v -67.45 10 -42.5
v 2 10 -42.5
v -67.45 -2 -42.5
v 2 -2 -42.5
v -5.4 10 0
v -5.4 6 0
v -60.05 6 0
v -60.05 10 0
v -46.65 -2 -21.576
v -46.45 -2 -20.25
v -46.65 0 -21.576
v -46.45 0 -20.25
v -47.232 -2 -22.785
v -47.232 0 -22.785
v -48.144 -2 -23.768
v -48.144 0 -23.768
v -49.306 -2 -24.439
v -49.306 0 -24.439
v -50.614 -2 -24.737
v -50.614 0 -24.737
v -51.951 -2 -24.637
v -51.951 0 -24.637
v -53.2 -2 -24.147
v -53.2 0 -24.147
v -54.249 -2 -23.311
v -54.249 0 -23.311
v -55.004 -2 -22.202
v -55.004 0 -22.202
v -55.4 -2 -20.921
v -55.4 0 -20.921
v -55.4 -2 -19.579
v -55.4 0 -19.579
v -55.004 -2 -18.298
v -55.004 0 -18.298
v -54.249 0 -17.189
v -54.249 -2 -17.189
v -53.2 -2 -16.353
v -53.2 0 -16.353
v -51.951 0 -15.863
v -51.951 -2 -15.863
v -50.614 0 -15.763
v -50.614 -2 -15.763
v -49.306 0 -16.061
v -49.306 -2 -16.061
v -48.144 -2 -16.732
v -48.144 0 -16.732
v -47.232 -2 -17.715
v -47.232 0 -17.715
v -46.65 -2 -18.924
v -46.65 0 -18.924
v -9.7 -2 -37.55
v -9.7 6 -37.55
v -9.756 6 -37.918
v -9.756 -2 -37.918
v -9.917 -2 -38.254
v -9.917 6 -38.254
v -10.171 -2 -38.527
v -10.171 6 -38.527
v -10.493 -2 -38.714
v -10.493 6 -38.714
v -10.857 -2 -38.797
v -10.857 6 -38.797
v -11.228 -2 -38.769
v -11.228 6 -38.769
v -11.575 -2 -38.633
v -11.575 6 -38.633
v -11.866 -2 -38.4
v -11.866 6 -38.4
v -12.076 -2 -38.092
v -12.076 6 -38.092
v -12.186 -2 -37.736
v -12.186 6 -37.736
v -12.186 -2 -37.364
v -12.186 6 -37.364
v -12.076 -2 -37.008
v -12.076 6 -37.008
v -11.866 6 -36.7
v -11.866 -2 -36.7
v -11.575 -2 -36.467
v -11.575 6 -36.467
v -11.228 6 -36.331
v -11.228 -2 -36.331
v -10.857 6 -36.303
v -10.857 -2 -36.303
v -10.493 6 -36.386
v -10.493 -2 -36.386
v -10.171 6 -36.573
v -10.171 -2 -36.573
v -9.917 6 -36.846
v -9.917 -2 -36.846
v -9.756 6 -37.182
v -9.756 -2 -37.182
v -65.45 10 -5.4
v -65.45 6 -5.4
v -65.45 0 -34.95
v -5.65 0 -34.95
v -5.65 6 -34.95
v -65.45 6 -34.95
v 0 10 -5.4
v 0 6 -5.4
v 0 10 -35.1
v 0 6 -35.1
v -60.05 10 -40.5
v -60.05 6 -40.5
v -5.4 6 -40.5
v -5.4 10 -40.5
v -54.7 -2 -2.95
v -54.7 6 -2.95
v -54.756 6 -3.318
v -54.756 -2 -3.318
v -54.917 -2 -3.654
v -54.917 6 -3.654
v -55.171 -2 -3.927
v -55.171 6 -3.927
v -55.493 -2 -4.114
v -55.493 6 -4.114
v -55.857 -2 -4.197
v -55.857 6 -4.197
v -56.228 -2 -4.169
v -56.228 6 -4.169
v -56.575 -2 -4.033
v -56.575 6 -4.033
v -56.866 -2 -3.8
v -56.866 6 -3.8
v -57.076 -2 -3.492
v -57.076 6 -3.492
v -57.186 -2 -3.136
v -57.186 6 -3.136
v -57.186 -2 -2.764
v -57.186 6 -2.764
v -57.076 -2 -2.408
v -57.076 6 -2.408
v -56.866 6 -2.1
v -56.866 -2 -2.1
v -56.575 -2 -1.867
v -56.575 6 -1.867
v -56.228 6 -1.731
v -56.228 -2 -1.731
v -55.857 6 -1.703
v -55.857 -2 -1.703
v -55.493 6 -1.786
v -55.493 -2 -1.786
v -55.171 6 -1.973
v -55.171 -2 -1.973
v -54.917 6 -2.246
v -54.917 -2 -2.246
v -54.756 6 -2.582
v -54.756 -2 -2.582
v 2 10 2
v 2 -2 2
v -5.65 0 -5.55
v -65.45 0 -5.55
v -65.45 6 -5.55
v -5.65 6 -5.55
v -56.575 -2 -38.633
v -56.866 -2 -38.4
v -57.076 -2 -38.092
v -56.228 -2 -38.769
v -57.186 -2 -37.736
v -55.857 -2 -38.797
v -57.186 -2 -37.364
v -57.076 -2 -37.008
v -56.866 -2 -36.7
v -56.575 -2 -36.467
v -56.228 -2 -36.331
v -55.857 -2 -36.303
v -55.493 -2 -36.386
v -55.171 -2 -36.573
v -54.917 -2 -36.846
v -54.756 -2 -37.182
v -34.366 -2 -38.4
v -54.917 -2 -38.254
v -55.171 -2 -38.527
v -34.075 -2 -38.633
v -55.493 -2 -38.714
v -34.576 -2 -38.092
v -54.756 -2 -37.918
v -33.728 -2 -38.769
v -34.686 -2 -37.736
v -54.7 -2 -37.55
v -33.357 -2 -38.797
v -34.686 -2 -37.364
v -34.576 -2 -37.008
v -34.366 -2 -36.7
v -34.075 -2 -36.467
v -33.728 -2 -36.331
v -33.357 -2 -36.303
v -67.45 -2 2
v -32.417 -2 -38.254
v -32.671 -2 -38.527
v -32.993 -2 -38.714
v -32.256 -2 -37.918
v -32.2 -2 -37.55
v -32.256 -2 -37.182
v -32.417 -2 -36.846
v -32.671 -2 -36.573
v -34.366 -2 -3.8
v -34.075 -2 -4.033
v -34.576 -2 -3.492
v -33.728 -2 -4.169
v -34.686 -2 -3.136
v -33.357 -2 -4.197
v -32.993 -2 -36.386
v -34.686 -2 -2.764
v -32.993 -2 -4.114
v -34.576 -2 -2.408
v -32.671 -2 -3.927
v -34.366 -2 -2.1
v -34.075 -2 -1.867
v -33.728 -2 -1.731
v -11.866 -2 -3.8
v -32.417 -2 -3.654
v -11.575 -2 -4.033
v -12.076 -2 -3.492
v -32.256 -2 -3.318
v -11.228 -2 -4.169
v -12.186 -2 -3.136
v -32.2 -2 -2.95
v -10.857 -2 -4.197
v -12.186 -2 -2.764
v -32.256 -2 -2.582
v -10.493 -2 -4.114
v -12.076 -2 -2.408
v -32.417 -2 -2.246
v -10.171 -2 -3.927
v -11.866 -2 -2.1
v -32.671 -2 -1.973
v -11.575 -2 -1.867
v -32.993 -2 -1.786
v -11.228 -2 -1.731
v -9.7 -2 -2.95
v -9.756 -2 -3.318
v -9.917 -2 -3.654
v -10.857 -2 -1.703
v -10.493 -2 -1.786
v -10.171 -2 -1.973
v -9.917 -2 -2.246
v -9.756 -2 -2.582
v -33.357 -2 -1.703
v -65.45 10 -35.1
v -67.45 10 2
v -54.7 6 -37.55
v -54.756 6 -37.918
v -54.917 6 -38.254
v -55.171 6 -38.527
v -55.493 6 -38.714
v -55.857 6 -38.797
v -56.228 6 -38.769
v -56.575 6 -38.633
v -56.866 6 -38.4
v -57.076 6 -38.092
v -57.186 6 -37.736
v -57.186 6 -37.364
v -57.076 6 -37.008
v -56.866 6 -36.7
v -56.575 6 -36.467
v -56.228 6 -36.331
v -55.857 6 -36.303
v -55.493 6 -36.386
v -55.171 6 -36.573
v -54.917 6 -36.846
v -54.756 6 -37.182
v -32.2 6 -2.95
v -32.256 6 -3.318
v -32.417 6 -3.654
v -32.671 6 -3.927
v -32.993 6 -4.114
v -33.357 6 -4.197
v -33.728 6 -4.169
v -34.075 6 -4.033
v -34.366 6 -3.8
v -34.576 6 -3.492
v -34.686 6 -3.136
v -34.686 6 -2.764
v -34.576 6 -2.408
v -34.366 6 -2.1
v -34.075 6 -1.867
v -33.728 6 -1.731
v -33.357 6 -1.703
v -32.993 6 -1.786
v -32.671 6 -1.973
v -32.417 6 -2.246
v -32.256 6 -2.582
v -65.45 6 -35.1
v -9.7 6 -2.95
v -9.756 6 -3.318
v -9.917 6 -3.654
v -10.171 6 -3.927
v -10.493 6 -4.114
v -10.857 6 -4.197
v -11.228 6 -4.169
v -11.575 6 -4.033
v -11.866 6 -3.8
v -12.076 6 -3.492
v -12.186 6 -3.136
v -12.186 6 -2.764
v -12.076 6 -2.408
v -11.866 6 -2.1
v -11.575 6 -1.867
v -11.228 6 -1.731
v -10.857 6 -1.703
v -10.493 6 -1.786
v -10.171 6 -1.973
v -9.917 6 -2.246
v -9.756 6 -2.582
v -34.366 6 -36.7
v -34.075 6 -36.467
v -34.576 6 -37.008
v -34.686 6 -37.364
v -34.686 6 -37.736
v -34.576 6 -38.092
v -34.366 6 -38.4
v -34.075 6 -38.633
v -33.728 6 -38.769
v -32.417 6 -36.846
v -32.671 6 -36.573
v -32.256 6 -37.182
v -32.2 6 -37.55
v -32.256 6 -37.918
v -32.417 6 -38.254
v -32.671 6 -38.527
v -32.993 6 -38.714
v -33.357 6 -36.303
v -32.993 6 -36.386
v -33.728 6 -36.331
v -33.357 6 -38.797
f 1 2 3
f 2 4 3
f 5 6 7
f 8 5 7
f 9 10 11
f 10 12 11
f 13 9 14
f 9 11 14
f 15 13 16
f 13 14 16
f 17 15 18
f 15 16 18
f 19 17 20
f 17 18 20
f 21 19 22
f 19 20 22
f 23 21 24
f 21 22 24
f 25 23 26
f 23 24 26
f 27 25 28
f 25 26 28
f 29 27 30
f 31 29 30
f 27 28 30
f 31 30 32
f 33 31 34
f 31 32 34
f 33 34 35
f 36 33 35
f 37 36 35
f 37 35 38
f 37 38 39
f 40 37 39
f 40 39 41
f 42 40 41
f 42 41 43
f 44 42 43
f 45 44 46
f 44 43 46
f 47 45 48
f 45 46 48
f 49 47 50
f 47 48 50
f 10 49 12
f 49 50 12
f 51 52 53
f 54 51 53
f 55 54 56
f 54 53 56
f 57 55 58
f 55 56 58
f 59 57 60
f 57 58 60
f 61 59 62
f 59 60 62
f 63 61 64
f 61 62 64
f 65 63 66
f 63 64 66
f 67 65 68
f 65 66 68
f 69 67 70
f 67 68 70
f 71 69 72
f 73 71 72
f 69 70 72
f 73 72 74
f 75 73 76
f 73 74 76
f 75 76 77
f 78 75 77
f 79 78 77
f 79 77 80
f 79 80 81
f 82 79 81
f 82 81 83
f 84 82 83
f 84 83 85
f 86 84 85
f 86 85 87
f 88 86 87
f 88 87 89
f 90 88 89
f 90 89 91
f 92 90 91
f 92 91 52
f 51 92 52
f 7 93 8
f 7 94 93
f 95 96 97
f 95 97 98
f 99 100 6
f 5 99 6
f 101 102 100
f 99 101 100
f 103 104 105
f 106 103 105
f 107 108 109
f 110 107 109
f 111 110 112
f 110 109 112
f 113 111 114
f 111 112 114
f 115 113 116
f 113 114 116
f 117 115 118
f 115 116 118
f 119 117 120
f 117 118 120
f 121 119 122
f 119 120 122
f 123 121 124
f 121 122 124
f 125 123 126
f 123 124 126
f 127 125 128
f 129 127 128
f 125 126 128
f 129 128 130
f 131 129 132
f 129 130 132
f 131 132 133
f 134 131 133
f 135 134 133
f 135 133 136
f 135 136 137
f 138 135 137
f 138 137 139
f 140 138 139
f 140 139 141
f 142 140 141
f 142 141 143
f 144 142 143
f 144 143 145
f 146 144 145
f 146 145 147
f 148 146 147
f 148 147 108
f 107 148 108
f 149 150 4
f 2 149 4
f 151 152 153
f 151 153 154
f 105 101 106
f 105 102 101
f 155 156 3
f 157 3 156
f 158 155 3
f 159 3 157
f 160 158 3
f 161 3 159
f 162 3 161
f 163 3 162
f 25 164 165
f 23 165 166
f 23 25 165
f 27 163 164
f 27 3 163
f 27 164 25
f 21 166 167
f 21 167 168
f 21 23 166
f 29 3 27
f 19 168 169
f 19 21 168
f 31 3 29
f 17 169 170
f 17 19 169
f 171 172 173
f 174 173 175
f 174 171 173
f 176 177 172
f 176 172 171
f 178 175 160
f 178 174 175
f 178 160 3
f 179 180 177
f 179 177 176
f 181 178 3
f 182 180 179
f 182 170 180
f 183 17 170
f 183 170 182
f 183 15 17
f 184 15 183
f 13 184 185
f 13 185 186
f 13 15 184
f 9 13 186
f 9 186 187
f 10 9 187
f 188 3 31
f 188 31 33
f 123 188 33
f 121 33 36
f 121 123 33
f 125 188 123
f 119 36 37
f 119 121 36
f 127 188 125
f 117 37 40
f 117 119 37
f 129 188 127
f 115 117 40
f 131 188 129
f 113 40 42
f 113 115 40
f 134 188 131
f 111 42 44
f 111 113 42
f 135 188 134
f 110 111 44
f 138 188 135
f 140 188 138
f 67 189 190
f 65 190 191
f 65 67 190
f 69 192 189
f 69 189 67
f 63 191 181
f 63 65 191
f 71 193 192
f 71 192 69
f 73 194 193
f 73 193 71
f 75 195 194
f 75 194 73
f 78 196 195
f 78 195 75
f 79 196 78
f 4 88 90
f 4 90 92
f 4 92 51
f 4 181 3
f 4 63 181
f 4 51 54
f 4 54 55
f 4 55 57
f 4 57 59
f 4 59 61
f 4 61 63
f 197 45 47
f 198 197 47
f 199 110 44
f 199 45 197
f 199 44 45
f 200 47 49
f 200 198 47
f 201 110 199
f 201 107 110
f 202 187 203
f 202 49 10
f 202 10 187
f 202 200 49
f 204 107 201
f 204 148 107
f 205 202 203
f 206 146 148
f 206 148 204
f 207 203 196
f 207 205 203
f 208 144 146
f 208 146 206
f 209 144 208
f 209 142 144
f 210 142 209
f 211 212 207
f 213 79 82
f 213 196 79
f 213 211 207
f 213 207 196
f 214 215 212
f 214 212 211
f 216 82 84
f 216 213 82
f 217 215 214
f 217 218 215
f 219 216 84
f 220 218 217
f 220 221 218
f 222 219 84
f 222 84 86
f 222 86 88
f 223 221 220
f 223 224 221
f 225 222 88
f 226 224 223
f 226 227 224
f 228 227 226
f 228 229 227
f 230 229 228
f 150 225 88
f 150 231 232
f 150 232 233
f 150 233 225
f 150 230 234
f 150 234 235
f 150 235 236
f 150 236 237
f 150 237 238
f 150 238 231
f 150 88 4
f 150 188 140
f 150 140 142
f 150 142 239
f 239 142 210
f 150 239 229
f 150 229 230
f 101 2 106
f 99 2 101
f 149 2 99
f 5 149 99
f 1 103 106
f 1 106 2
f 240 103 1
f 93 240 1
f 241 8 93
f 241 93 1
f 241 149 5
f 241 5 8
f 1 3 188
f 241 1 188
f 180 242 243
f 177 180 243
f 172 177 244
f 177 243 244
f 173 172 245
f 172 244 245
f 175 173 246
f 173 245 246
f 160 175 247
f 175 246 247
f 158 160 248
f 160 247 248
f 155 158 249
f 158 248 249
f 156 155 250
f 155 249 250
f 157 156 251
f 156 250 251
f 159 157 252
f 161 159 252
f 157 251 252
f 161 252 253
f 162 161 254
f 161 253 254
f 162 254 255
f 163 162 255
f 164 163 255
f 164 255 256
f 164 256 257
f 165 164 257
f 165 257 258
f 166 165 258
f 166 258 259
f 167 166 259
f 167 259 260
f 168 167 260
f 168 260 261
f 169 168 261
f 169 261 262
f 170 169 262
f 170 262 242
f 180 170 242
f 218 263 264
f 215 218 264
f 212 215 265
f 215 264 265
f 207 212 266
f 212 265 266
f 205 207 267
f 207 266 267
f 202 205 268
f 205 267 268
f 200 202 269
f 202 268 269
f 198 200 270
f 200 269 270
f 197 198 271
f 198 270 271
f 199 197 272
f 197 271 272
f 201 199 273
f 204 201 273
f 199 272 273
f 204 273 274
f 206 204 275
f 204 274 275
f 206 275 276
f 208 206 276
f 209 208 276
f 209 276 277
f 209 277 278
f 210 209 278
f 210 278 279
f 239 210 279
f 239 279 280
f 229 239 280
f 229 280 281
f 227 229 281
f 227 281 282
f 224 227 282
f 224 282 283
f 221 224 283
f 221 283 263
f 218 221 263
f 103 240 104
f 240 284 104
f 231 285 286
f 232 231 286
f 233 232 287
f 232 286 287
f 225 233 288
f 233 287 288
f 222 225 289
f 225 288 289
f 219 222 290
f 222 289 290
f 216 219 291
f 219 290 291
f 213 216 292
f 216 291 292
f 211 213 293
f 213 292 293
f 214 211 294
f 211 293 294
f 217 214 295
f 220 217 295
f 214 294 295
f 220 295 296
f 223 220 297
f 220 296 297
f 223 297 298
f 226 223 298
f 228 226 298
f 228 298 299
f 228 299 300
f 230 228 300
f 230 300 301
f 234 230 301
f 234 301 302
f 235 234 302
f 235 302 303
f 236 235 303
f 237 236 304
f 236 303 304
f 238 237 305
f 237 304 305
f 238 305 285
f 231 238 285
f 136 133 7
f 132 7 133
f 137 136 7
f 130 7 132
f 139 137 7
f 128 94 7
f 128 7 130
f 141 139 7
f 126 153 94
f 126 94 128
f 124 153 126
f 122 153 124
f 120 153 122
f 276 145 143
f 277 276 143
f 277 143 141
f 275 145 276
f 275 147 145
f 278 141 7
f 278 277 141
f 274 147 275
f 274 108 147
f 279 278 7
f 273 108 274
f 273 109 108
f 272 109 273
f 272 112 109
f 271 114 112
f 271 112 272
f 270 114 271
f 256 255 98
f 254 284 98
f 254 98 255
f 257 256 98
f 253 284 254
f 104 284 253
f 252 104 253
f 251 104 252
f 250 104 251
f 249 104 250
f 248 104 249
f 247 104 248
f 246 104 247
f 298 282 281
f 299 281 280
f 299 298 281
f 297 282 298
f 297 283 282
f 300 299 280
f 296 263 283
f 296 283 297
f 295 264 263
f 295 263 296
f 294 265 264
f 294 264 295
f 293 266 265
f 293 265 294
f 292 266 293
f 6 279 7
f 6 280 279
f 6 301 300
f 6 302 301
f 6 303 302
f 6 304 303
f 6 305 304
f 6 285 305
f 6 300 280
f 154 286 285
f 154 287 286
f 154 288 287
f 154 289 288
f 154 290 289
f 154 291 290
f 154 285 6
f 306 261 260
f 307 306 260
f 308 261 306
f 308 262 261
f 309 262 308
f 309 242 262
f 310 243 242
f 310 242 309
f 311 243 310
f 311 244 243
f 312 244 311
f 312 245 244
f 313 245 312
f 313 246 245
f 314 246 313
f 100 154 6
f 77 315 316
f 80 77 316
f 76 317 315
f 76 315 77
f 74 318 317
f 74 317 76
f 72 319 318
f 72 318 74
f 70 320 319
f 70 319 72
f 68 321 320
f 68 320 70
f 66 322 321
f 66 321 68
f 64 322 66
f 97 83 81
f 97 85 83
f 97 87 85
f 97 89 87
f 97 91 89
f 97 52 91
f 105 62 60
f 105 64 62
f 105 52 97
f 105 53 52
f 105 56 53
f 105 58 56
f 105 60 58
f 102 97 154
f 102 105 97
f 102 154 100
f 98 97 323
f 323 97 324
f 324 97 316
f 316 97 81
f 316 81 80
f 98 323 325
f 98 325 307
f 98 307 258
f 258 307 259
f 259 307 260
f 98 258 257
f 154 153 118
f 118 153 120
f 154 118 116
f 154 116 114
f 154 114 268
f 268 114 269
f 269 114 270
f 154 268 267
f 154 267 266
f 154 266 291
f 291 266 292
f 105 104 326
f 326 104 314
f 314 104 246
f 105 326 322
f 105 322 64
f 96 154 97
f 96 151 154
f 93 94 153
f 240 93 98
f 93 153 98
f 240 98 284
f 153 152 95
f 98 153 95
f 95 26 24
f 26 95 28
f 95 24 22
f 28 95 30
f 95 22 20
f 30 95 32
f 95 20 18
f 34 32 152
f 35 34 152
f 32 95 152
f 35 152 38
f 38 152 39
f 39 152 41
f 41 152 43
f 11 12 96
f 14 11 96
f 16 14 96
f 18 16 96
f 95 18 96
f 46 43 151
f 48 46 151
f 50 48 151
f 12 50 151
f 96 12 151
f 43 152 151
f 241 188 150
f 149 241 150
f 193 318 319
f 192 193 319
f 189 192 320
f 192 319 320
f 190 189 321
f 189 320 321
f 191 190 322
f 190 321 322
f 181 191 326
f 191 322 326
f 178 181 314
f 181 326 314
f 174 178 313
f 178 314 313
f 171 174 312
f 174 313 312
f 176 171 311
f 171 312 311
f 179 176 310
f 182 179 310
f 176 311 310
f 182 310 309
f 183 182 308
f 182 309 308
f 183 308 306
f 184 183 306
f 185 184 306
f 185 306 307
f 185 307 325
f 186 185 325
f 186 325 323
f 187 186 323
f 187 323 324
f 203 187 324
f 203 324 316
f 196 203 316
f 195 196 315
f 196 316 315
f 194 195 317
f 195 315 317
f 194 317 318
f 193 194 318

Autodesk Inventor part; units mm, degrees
ref_plane "YZ Plane" through (0, 0, 0) normal (1, 0, 0) x (0, 1, 0)
ref_plane "XZ Plane" through (0, 0, 0) normal (0, 1, 0) x (-1, 0, 0)
ref_plane "XY Plane" through (0, 0, 0) normal (0, 0, 1) x (1, 0, 0)
sketch "스케치1" plane through (0, 0, 0) normal (0, 1, 0) x (-1, 0, 0)
  line L0 (0, 0) -> (65.45, 0)
  line L1 (65.45, 0) -> (65.45, -40.5)
  line L2 (65.45, -40.5) -> (0, -40.5)
  line L3 (0, -40.5) -> (0, 0)
  line L4 (67.45, -42.5) -> (67.45, 2)
  line L5 (67.45, 2) -> (-2, 2)
  line L6 (-2, 2) -> (-2, -42.5)
  line L7 (-2, -42.5) -> (67.45, -42.5)
  line L8 (65.45, -20.25) -> (0, -20.25) construction
  line L9 (32.725, 0) -> (32.725, -40.5) construction
  line L10 (65.45, -5.4) -> (60.05, 0)
  line L11 (65.45, -35.1) -> (60.05, -40.5)
  line L12 (0, 0) -> (0, -40.5)
  line L13 (0, -5.4) -> (5.4, 0)
  line L14 (0, -35.1) -> (5.4, -40.5)
  dimension "d0" = 65.45
  dimension "d1" = 40.5
  dimension "d2" = 2
  dimension "d3" = 5.4
  dimension "d4" = 5.4
extrude "돌출1" add sketch "스케치1" along normal blind 10 contours L0 L13 L3 | L0 L1 L10 | L14 L2 L3 | L1 L2 L11 | L7 L6 L5 L4
sketch "스케치2" plane through (0, 0, 0) normal (0, -1, 0) x (1, 0, 0)
  line L0 (-67.45, 2) -> (2, 2) projected
  line L1 (-67.45, -42.5) -> (-67.45, 2) projected
  line L2 (2, -42.5) -> (-67.45, -42.5) projected
  line L3 (2, 2) -> (2, -42.5) projected
  line L4 (0, -5.4) -> (-5.4, 0) projected
  line L5 (0, -35.1) -> (0, -5.4) projected
  line L6 (-60.05, -40.5) -> (-5.4, -40.5) projected
  line L7 (-65.45, -5.4) -> (-65.45, -35.1) projected
  line L8 (-5.4, 0) -> (-60.05, 0) projected
  line L9 (-5.4, -40.5) -> (0, -35.1) projected
  line L10 (-65.45, -35.1) -> (-60.05, -40.5) projected
  line L11 (-60.05, 0) -> (-65.45, -5.4) projected
  point P0 (0, 0)
extrude "돌출2" add sketch "스케치2" along normal blind 2 contours L0 L3 L2 L1 | L5 L9 L6 L10 L7 L11 L8 L4
sketch "스케치3" plane through (0, 0, 0) normal (0, 1, 0) x (1, 0, 0)
  line L0 (0, 35.1) -> (0, 5.4) projected
  line L1 (-5.4, 40.5) -> (0, 35.1) projected
  line L2 (-60.05, 40.5) -> (-5.4, 40.5) projected
  line L3 (-65.45, 35.1) -> (-60.05, 40.5) projected
  line L4 (-65.45, 5.4) -> (-65.45, 35.1) projected
  line L5 (-60.05, 0) -> (-65.45, 5.4) projected
  line L6 (-5.4, 0) -> (-60.05, 0) projected
  line L7 (0, 5.4) -> (-5.4, 0) projected
  line L8 (-65.45, 5.4) -> (-65.45, 35.1) projected
  line L9 (-65.45, 5.55) -> (-5.65, 5.55)
  line L10 (-5.65, 5.55) -> (-5.65, 34.95)
  line L11 (-5.65, 34.95) -> (-65.45, 34.95)
  line L12 (-65.45, 34.95) -> (-65.45, 5.55)
  line L13 (0, 35.1) -> (0, 5.4) projected
  line L14 (-5.4, 40.5) -> (0, 35.1) projected
  line L15 (-60.05, 40.5) -> (-5.4, 40.5) projected
  line L16 (-65.45, 35.1) -> (-60.05, 40.5) projected
  line L17 (-65.45, 5.4) -> (-65.45, 35.1) projected
  line L18 (-60.05, 0) -> (-65.45, 5.4) projected
  line L19 (-5.4, 0) -> (-60.05, 0) projected
  line L20 (0, 5.4) -> (-5.4, 0) projected
  point P0 (0, 0)
  point P1 (-5.65, 20.25)
  point P2 (-65.45, 20.25)
  dimension "d9" = 59.8
  dimension "d10" = 29.4
extrude "돌출3" add sketch "스케치3" along normal blind 6 contours L0 L7 L6 L5 L4 L9 L10 L11 L3 L2 L1
sketch "스케치4" plane through (0, 0, 0) normal (0, 1, 0) x (1, 0, 0)
  line L0 (-5.65, 34.95) -> (-65.45, 34.95) projected
  line L1 (-65.45, 5.55) -> (-65.45, 34.95) projected
  line L2 (-65.45, 5.55) -> (-5.65, 5.55) projected
  line L3 (-5.65, 5.55) -> (-5.65, 34.95) projected
  circle A0 centre (-50.95, 20.25) radius 4.5
  point P0 (0, 0)
  dimension "d14" = 9
  dimension "d17" = 14.5
extrude "돌출4" cut sketch "스케치4" against normal blind 6 contours A0
sketch "스케치5" plane through (0, 6, 0) normal (0, 1, 0) x (1, 0, 0)
  line L0 (-5.65, 5.55) -> (-65.45, 5.55) projected
  line L1 (-65.45, 5.4) -> (-65.45, 5.55) projected
  line L2 (-60.05, 0) -> (-65.45, 5.4) projected
  line L3 (-5.4, 0) -> (-60.05, 0) projected
  line L4 (0, 5.4) -> (-5.4, 0) projected
  line L5 (0, 35.1) -> (0, 5.4) projected
  line L6 (-5.4, 40.5) -> (0, 35.1) projected
  line L7 (-60.05, 40.5) -> (-5.4, 40.5) projected
  line L8 (-65.45, 35.1) -> (-60.05, 40.5) projected
  line L9 (-65.45, 34.95) -> (-65.45, 35.1) projected
  line L10 (-65.45, 34.95) -> (-5.65, 34.95) projected
  line L11 (-5.65, 34.95) -> (-5.65, 5.55) projected
  line L12 (-10.4708, 2.95) -> (-58.727, 2.95) construction
  circle A0 centre (-55.95, 2.95) radius 1.25
  line L13 (-67.45, 42.5) -> (-67.45, -2) projected
  circle A1 centre (-33.45, 2.95) radius 1.25
  circle A2 centre (-10.95, 2.95) radius 1.25
  line L14 (-65.45, 5.55) -> (-65.45, 34.95) construction
  line L15 (-65.45, 20.25) -> (-5.65, 20.25) construction
  circle A3 centre (-55.95, 37.55) radius 1.25
  circle A4 centre (-33.45, 37.55) radius 1.25
  circle A5 centre (-10.95, 37.55) radius 1.25
  point P0 (0, 0)
  point P1 (-10.4708, 37.55)
  dimension "d18" = 2.5
  dimension "d19" = 11.5
  dimension "d22" = 22.5
  dimension "d27" = 34.6
extrude "돌출5" cut sketch "스케치5" against normal through all contours A0 | A1 | A2 | A3 | A4 | A5
sketch "스케치6" plane through (-65.45, 0, -34.95) normal (0, 0, 1) x (1, 0, 0)
  point P0 (65.45, 0)
properties part number "mx-106"
